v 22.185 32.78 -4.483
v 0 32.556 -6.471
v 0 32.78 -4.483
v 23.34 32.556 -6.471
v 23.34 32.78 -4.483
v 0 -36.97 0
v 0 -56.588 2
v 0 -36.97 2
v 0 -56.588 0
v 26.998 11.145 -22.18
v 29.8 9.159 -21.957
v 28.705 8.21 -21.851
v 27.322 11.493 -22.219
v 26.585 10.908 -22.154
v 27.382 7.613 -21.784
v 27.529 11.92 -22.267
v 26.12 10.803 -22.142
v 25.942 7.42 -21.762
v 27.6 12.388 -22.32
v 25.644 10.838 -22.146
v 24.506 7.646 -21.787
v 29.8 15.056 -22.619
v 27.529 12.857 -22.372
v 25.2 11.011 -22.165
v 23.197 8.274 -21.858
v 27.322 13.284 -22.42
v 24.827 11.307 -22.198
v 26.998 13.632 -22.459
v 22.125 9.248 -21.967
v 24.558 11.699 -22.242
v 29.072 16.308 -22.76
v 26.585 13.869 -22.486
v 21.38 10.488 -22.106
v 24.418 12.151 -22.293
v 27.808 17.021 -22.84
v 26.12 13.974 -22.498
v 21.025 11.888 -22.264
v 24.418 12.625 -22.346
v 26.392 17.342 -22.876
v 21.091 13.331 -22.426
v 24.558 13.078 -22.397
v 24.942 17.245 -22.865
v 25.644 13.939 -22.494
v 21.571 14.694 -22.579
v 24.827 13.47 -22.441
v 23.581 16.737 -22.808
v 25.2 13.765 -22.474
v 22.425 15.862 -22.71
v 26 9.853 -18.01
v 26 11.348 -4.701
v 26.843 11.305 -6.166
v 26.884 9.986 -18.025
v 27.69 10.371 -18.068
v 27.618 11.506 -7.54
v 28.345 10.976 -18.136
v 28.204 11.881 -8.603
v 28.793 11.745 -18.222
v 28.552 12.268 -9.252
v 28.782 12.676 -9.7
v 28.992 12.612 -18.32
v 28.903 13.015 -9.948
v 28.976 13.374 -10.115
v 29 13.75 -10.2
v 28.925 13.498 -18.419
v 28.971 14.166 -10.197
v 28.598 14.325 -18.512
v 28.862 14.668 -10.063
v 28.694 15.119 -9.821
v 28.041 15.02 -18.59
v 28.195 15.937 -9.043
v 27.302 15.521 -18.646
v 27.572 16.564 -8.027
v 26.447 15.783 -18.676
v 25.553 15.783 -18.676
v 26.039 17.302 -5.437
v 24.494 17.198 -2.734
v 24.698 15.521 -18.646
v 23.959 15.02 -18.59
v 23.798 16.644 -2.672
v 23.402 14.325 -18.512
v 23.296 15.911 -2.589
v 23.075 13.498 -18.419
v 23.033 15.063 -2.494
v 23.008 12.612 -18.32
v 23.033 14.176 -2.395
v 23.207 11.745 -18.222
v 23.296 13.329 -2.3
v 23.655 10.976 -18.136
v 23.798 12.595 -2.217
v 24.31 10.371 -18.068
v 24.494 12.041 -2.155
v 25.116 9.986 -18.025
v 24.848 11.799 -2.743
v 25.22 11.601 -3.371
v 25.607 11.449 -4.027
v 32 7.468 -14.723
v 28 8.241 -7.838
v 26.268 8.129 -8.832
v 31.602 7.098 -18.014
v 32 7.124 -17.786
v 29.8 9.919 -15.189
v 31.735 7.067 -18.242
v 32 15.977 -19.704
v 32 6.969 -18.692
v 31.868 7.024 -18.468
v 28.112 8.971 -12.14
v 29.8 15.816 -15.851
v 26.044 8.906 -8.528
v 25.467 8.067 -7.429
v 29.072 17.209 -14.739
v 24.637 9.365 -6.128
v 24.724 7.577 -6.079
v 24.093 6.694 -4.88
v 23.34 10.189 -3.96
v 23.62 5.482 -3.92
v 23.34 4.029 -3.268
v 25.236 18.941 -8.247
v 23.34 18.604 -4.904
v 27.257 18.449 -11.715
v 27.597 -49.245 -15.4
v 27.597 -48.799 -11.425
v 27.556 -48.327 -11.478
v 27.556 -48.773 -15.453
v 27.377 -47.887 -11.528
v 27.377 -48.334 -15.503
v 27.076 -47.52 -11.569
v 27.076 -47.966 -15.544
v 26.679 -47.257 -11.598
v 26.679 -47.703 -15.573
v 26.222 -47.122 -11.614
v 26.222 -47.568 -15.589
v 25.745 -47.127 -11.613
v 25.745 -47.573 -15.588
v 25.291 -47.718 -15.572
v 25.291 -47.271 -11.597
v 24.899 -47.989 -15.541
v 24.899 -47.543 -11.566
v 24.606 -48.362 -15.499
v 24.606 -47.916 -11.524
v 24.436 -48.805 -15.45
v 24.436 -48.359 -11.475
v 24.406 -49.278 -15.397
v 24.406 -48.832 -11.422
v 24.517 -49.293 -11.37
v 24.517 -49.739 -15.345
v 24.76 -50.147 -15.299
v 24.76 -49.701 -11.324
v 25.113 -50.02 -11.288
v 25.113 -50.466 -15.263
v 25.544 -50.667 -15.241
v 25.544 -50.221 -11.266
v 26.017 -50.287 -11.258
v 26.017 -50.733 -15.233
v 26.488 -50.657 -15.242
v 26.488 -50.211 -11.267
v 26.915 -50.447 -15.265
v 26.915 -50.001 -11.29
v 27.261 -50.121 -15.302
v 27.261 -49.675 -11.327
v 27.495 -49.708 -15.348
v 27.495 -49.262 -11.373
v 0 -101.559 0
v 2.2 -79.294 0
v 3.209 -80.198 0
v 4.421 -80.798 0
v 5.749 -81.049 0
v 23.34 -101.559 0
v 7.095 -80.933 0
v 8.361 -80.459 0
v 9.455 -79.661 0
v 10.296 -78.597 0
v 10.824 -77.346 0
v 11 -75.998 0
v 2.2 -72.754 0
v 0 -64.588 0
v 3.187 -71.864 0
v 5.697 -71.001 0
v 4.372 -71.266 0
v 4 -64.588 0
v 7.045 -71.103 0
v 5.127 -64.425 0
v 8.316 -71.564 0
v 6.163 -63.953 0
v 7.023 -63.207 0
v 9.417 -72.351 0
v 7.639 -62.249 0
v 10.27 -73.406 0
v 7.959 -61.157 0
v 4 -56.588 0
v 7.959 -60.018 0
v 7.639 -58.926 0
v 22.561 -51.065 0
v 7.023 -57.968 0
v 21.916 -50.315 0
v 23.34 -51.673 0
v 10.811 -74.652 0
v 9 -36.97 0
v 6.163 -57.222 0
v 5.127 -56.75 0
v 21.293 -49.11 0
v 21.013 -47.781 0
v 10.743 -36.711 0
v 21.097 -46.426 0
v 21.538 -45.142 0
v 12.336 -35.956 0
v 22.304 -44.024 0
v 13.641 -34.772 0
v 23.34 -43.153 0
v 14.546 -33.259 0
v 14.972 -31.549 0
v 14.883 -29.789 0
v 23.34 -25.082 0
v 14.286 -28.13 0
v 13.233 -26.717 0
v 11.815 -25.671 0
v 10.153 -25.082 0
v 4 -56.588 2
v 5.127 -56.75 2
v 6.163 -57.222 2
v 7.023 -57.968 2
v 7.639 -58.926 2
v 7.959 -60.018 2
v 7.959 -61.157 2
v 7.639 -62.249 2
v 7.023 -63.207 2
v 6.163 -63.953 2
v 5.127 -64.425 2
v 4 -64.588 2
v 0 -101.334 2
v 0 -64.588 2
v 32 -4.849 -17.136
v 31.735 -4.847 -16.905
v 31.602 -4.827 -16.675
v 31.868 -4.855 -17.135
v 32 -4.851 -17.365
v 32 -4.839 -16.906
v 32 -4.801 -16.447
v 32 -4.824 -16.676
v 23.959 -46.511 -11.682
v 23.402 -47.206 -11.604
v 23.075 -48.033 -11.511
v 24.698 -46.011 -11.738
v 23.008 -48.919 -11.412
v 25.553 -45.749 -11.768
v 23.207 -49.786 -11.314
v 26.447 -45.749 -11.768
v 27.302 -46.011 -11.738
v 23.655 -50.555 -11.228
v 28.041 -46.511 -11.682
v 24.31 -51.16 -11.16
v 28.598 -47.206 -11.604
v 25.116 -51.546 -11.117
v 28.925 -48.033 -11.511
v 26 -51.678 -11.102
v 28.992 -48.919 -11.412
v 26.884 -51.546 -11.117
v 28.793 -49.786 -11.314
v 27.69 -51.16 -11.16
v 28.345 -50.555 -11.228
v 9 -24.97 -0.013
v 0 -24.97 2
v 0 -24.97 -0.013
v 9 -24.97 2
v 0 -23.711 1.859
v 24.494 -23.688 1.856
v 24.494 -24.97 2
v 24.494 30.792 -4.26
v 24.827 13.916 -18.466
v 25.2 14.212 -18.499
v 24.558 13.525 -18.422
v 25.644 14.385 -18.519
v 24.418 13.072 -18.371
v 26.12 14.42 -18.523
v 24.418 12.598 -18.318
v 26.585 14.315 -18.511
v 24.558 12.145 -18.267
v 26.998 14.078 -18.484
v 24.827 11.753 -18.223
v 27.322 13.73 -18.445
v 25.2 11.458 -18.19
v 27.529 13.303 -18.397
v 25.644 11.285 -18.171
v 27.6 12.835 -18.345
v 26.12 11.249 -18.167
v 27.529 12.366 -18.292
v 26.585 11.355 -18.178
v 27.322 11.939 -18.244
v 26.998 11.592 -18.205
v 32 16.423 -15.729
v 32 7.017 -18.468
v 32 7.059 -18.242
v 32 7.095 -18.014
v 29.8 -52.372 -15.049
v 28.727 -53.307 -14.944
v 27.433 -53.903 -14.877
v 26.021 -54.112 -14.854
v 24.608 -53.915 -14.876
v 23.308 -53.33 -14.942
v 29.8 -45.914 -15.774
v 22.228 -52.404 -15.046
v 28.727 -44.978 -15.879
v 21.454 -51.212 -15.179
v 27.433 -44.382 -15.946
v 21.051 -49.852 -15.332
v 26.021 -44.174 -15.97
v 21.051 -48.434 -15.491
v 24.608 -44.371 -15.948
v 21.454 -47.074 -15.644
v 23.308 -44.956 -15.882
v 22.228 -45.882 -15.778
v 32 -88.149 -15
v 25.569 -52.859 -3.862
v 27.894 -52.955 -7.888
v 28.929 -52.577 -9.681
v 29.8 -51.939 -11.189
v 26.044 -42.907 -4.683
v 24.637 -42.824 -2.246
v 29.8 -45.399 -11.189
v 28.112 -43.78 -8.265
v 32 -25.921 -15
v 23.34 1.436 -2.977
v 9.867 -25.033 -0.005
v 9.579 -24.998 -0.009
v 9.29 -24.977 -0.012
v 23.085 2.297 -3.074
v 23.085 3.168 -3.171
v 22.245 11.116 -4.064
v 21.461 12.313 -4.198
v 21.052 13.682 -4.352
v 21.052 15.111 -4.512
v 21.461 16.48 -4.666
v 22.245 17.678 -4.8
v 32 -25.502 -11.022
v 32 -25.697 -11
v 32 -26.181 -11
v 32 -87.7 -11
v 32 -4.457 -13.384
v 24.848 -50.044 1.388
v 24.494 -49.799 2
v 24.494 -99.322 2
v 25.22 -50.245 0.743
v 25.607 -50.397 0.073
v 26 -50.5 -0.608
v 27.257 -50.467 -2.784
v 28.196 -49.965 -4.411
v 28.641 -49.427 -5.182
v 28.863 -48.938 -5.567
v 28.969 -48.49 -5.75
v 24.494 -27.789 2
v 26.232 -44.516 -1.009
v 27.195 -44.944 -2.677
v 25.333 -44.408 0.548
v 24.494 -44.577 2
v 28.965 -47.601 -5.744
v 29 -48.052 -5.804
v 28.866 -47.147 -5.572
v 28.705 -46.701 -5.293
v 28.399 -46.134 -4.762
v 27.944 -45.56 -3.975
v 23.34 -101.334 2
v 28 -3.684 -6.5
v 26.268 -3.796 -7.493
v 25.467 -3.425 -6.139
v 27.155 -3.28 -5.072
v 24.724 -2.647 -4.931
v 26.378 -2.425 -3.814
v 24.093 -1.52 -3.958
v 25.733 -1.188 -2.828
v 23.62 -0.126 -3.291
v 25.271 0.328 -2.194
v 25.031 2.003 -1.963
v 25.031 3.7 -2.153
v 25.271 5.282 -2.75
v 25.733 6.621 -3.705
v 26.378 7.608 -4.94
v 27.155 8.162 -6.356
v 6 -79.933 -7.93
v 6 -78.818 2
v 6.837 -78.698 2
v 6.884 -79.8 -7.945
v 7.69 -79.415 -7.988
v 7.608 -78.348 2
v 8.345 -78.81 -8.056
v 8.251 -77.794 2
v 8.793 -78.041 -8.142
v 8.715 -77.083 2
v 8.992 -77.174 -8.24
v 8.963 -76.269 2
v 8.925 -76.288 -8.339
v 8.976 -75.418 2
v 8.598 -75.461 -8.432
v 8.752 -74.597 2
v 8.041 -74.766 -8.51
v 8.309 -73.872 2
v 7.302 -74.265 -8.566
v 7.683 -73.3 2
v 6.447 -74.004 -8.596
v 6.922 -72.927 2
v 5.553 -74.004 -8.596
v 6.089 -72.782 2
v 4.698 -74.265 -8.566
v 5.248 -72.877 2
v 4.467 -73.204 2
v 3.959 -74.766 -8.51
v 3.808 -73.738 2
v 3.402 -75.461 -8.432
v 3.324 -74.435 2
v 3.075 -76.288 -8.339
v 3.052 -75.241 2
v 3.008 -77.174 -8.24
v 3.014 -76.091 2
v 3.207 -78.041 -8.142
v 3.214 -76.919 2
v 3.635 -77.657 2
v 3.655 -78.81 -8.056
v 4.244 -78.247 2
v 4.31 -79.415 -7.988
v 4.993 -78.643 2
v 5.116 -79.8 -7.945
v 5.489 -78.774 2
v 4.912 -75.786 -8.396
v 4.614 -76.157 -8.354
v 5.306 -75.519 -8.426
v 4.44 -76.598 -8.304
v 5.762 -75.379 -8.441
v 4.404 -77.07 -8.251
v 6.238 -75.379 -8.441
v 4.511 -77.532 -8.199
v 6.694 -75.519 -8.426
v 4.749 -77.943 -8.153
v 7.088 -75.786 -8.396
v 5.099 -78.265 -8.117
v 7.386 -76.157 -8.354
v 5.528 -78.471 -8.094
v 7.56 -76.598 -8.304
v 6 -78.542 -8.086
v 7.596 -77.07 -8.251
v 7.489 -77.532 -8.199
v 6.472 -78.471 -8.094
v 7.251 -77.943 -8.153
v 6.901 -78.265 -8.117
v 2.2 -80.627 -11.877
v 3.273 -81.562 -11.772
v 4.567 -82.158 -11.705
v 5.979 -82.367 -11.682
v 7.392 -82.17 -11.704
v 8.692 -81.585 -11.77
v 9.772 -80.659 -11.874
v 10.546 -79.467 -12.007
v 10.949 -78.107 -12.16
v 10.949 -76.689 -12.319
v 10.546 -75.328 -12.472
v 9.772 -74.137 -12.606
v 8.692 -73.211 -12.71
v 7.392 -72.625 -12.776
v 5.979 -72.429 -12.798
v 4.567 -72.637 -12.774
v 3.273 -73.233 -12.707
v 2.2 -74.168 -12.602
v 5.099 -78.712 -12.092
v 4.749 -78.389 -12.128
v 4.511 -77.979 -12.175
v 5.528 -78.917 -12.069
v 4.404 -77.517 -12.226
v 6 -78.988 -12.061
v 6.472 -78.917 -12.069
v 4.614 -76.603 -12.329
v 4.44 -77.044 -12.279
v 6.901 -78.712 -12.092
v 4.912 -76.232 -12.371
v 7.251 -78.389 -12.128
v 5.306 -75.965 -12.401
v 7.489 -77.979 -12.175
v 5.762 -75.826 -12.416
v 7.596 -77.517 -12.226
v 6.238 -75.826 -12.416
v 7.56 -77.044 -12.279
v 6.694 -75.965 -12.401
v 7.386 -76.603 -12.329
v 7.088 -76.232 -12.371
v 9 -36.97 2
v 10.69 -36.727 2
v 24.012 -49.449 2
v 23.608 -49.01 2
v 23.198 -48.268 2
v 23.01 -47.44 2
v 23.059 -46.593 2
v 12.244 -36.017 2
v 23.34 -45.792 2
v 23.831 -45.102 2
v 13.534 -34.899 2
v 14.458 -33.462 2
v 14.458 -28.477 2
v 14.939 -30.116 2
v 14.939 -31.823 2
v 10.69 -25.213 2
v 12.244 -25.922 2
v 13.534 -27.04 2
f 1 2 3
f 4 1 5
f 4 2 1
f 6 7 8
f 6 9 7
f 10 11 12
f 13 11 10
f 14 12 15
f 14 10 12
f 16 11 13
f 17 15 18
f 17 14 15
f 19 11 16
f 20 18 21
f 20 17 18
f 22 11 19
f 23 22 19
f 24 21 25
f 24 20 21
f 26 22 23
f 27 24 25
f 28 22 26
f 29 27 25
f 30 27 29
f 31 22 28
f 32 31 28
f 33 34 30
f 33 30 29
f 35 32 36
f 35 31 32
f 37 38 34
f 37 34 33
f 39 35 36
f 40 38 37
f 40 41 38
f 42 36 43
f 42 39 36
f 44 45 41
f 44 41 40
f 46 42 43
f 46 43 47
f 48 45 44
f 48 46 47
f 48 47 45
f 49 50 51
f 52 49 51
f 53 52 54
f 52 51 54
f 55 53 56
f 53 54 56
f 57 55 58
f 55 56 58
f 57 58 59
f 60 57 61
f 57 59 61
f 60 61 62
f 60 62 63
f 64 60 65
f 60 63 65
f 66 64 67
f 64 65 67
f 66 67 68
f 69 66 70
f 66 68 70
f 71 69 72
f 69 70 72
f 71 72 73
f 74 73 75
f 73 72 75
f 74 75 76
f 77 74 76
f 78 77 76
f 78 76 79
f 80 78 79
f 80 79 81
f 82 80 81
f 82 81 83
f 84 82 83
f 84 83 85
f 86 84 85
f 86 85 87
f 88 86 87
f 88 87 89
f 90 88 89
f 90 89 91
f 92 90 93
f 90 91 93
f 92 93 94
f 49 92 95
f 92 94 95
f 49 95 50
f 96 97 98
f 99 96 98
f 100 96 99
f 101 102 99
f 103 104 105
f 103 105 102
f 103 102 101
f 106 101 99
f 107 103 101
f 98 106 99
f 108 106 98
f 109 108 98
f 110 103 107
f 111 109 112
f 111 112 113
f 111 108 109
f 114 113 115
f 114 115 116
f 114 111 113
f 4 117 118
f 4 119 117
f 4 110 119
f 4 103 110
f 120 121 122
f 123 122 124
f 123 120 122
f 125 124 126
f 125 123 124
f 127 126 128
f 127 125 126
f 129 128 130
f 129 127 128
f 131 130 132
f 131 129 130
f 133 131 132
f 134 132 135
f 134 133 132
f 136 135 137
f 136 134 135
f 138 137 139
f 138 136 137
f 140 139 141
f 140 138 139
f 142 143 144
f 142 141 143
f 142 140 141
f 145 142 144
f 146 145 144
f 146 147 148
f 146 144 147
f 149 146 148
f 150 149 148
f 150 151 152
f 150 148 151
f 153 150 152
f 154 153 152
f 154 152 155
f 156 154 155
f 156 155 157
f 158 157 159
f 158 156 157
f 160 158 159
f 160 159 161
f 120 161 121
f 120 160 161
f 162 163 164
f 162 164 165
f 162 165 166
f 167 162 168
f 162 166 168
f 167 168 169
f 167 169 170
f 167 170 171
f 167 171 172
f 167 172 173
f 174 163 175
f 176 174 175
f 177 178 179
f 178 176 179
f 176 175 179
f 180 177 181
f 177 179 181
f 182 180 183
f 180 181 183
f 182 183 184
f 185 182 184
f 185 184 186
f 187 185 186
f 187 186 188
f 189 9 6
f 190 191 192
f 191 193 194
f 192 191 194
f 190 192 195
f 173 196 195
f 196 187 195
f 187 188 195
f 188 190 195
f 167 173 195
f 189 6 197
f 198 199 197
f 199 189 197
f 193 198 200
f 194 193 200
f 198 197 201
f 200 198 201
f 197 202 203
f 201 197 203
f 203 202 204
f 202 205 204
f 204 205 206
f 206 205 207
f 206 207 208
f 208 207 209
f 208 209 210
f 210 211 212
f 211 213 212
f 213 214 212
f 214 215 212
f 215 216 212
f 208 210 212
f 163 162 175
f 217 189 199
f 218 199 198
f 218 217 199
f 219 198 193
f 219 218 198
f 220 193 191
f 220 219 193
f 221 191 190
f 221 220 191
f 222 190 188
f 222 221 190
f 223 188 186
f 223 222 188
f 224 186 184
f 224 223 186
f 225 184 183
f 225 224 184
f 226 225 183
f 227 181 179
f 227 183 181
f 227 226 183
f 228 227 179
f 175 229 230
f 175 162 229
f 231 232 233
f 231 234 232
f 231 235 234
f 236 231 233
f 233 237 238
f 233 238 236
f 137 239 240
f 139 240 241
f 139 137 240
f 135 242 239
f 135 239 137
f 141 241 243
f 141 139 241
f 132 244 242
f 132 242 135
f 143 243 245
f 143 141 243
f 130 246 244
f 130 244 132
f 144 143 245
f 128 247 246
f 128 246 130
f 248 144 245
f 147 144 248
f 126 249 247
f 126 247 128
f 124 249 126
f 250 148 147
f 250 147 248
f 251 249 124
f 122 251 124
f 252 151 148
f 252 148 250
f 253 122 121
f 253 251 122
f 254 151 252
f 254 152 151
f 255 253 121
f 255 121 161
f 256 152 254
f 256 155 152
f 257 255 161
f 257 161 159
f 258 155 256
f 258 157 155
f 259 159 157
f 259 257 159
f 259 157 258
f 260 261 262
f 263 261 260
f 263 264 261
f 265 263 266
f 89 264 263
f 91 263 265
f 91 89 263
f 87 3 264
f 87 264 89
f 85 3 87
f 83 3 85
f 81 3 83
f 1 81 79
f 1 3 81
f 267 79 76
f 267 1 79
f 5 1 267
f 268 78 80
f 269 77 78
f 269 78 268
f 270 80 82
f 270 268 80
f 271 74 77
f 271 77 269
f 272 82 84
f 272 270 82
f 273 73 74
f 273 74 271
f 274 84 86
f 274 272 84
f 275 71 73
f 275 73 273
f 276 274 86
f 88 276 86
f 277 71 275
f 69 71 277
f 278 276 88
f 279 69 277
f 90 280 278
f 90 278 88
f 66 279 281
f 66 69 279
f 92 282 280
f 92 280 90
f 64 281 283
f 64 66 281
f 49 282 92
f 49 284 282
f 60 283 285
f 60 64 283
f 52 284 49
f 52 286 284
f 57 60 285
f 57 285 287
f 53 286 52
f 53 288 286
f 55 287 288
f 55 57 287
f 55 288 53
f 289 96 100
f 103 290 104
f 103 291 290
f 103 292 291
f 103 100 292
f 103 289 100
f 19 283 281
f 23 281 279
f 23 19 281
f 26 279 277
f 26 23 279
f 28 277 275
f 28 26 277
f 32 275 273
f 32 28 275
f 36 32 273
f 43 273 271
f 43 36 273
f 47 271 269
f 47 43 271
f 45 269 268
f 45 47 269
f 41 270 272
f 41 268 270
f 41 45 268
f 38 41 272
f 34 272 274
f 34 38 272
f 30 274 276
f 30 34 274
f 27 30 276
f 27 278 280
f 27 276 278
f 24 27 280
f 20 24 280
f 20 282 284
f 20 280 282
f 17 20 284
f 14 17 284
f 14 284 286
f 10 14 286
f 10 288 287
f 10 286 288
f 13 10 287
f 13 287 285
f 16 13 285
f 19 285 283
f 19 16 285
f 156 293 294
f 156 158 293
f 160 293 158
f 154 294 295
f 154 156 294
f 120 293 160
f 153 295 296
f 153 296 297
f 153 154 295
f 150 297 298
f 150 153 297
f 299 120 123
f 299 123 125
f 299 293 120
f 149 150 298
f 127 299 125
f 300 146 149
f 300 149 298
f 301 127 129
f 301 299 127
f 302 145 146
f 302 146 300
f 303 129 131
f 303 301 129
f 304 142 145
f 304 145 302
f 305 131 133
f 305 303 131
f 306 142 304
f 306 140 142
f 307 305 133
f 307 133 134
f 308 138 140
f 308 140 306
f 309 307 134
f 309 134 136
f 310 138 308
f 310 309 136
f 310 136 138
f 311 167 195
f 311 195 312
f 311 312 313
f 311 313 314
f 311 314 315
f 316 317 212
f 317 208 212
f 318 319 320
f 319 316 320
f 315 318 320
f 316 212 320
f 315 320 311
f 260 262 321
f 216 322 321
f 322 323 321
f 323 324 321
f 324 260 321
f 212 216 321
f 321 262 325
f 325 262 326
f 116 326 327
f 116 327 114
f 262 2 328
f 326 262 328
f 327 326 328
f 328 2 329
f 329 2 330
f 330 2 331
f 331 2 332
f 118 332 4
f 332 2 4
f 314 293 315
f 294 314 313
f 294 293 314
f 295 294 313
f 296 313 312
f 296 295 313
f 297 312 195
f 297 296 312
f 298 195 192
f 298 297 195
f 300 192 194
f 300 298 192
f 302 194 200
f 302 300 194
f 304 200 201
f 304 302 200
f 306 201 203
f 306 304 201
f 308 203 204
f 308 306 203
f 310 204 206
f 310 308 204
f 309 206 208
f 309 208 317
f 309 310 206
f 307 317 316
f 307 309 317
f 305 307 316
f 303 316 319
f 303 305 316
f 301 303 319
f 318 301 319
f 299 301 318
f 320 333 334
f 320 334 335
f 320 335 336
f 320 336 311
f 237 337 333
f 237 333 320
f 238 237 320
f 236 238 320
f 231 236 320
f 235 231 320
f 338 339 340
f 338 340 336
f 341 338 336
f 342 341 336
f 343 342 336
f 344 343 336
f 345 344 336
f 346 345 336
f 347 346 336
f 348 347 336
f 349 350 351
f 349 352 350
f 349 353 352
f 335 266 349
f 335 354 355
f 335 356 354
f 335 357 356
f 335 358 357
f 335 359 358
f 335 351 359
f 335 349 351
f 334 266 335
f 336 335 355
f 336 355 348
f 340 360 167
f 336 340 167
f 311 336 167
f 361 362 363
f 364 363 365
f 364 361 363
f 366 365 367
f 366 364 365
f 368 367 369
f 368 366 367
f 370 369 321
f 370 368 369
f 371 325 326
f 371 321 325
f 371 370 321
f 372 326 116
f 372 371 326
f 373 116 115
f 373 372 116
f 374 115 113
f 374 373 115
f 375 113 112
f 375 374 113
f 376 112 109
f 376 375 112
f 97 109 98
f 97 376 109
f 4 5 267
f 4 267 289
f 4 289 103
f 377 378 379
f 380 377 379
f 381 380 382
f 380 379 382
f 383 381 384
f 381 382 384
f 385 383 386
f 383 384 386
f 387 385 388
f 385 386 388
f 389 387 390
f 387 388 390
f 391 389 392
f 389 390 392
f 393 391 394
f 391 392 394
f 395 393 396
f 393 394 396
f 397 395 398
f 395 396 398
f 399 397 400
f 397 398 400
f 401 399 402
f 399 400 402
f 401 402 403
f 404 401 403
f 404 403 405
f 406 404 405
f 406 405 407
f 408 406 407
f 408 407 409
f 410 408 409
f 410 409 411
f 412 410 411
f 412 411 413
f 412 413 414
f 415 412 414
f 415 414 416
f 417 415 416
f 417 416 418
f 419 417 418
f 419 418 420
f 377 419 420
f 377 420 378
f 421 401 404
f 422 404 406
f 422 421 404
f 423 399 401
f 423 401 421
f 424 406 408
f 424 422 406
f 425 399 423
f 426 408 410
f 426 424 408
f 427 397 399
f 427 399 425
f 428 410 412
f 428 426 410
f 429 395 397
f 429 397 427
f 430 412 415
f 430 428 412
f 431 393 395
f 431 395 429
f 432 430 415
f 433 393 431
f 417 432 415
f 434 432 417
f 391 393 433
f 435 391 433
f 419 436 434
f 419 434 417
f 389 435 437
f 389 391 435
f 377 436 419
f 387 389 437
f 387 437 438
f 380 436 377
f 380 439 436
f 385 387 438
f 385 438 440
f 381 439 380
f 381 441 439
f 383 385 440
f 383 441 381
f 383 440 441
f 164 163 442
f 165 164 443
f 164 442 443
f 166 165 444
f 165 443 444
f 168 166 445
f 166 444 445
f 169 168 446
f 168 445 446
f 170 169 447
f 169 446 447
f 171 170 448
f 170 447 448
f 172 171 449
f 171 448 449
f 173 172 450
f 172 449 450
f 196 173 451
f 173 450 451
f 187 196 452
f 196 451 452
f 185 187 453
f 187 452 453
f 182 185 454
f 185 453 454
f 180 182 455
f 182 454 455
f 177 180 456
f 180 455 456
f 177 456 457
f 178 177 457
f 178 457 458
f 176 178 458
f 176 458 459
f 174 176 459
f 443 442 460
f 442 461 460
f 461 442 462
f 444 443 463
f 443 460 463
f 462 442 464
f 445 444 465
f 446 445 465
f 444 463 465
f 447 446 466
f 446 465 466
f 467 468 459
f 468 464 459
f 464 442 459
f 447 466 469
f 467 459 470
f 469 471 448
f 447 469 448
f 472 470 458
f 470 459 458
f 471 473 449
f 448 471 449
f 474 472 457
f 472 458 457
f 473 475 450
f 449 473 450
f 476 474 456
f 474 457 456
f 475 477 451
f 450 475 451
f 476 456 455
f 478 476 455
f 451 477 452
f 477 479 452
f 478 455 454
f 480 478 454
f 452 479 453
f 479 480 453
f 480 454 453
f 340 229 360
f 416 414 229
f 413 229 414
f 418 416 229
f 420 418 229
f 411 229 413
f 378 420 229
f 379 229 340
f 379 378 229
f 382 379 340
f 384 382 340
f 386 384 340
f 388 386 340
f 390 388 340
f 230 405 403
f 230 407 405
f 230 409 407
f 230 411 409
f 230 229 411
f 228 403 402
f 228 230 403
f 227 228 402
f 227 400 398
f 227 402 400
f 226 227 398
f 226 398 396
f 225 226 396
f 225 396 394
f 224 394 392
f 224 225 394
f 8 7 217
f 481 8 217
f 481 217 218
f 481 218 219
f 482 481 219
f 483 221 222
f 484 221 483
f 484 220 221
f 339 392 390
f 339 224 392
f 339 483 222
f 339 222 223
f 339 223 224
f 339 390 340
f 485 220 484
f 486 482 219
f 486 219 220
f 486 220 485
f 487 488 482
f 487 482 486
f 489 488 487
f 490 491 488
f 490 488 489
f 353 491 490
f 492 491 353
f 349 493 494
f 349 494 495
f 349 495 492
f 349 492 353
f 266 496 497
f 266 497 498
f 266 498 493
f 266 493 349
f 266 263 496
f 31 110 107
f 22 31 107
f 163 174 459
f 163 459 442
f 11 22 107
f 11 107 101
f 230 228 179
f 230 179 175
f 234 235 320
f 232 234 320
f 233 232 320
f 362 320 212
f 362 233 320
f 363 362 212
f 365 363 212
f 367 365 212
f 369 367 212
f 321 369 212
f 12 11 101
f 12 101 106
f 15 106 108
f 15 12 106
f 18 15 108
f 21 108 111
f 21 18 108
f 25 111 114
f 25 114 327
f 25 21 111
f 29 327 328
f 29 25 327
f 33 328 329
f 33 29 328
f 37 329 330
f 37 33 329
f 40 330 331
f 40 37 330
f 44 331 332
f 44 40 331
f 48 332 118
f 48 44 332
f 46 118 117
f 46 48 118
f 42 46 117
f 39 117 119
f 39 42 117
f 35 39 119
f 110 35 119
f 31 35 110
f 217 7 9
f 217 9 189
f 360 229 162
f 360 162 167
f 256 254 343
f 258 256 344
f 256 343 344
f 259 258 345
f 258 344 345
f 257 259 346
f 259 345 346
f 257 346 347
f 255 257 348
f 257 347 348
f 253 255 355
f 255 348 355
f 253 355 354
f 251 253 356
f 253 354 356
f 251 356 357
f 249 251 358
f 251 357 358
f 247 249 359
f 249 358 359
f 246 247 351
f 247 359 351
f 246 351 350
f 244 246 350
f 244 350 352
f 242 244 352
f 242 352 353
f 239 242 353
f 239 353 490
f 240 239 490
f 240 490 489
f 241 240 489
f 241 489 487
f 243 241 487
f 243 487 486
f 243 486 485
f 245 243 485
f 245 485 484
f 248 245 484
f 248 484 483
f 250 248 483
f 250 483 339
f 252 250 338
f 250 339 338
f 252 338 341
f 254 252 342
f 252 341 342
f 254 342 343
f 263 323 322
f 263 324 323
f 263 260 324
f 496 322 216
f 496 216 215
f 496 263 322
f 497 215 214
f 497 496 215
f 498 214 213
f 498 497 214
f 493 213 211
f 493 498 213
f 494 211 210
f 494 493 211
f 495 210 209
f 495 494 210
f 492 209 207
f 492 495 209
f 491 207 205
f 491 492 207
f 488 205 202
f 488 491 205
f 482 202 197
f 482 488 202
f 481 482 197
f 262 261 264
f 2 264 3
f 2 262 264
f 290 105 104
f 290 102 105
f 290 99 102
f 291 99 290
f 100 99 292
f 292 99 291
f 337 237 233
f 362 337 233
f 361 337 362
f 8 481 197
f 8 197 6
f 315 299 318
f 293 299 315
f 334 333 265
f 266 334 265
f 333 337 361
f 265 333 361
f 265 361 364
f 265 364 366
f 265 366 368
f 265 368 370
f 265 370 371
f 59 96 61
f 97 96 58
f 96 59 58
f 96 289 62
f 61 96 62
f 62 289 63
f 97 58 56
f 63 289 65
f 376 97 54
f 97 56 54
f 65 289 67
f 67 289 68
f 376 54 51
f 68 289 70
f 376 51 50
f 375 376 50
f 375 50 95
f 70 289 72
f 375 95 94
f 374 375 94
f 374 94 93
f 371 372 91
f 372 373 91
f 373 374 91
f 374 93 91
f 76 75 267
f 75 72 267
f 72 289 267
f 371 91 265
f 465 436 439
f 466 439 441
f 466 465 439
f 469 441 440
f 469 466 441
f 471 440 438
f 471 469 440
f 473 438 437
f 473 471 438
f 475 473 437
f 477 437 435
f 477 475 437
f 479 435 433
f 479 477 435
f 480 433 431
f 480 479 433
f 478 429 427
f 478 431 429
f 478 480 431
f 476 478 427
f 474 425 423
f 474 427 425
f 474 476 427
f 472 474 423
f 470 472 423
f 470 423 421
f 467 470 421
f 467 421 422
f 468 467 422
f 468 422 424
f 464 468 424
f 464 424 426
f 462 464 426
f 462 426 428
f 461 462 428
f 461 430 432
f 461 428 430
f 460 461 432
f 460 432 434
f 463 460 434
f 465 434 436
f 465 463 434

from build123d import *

# Parameters (mm, degrees)
SKETCH1_W           = 23.339745962
SKETCH1_H           = 77.847771952
EXTRUDE1_DEPTH      = 2
SKETCH2_W           = 23.339745962
SKETCH2_H           = 58.47295833
EXTRUDE2_DEPTH      = 2
EXTRUDE3_DEPTH      = 2
EXTRUDE4_DEPTH      = 2
SKETCH5_W           = 29.172294857
SKETCH5_H           = 114.252589879
CUT_EXTRUDE1_DEPTH  = 2
SKETCH6_W           = 35.17541313
SKETCH6_H           = 36.355570025
CUT_EXTRUDE3_DEPTH  = 9
SKETCH7_W           = 29.640366785
SKETCH7_H           = 86.495658127
CUT_EXTRUDE4_DEPTH  = 9
SKETCH8_W           = 29.536232552
SKETCH8_H           = 67.327773858
CUT_EXTRUDE5_DEPTH  = 9
SKETCH9_W           = 23.303500438
SKETCH9_H           = 17.745035166
CUT_EXTRUDE6_DEPTH  = 9
SKETCH10_W          = 29.605950058
SKETCH10_H          = 24.209977647
CUT_EXTRUDE7_DEPTH  = 9
SKETCH11_W          = 17.28028661
SKETCH11_H          = 57.043927735
CUT_EXTRUDE8_DEPTH  = 9
SKETCH12_W          = 46.644962208
SKETCH12_H          = 26.527348651
CUT_EXTRUDE9_DEPTH  = 9
SKETCH13_W          = 27.90261226
SKETCH13_H          = 36.830907155
CUT_EXTRUDE10_DEPTH = 9
CUT_EXTRUDE11_DEPTH = 9
CUT_EXTRUDE12_DEPTH = 9
EXTRUDE5_REACH      = 108.706
SKETCH16_R          = 1.6
SKETCH18_R          = 3
CUT_EXTRUDE13_DEPTH = 16
CUT_EXTRUDE14_DEPTH = 46


with BuildPart() as part:
    # Sketch1 → Extrude1 (new body)
    with BuildSketch(Plane.XY):
        with Locations((11.669872981, -62.635077412)):
            Rectangle(SKETCH1_W, SKETCH1_H)
    extrude(amount=EXTRUDE1_DEPTH)

    # Sketch2 → Extrude2 (add)
    with BuildSketch(Plane(origin=(0, -0.312184271, -2.780754984), x_dir=(1, 0, 0), z_dir=(-1.8145207558717603e-15, 0.11156514837203096, 0.9937571220719512))):
        with Locations((11.669872981, 3.838577658)):
            Rectangle(SKETCH2_W, SKETCH2_H)
    extrude(amount=EXTRUDE2_DEPTH)

    # Sketch3 → Extrude3 (add)
    with BuildSketch(Plane(origin=(17.504809472, 0, 10.106406461), x_dir=(0.49999999999999906, -1.634548474587185e-15, -0.8660254037844393), z_dir=(0.8660254037844392, -2.831121005419217e-15, 0.499999999999999))):
        Polygon((7.883442522, -104.490571733), (28.990381057, -88.148722114), (28.990381057, -25.920882689), (7.883442522, -23.352575413), align=None)
    extrude(amount=EXTRUDE3_DEPTH)

    # Sketch4 → Extrude4 (add)
    with BuildSketch(Plane(origin=(16.293142957, 1.049476669, 9.348124653), x_dir=(0.49585100083824124, 0.031938838189501655, -0.8678200824956861), z_dir=(0.8660254037844394, 0.055782574186015135, 0.49687856103597455))):
        Polygon((16.15670827, 37.302716602), (33.476734925, 13.886588158), (28.056650386, -27.924204291), (7.502507009, -29.456207578), align=None)
    extrude(amount=EXTRUDE4_DEPTH)

    # Sketch5 → Cut-Extrude1 (cut)
    with BuildSketch(Plane(origin=(32, 0, 0), x_dir=(0, 0, -1), z_dir=(1, 0, 0))):
        with Locations((10.907999104, -37.350448714)):
            Rectangle(SKETCH5_W, SKETCH5_H)
    extrude(amount=CUT_EXTRUDE1_DEPTH, mode=Mode.SUBTRACT)

    # Sketch6 → Cut-Extrude3 (cut)
    with BuildSketch(Plane(origin=(0, -100.294881076, 11.25970626), x_dir=(1, 0, 0), z_dir=(0, -0.9937571220719427, 0.11156514837210559))):
        with Locations((14.876045987, -2.775102741)):
            Rectangle(SKETCH6_W, SKETCH6_H)
    extrude(amount=CUT_EXTRUDE3_DEPTH, mode=Mode.SUBTRACT)

    # Sketch7 → Cut-Extrude4 (cut)
    with BuildSketch(Plane.XY.offset(2)):
        with Locations((12.797447922, -61.090112125)):
            Rectangle(SKETCH7_W, SKETCH7_H)
    extrude(amount=CUT_EXTRUDE4_DEPTH, mode=Mode.SUBTRACT)

    # Sketch8 → Cut-Extrude5 (cut)
    with BuildSketch(Plane(origin=(0, -0.089053974, -0.79324074), x_dir=(1, 0, 0), z_dir=(-1.815565503199705e-15, 0.11156514837203098, 0.9937571220719512))):
        with Locations((12.836169201, 6.237775634)):
            Rectangle(SKETCH8_W, SKETCH8_H)
    extrude(amount=CUT_EXTRUDE5_DEPTH, mode=Mode.SUBTRACT)

    # Sketch9 → Cut-Extrude6 (cut)
    with BuildSketch(Plane(origin=(19.236860279, 0, 11.106406461), x_dir=(0.499999999999999, -1.6472663592524059e-15, -0.8660254037844393), z_dir=(0.8660254037844393, -2.8531490278241828e-15, 0.499999999999999))):
        with Locations((15.539372555, -25.628375436)):
            Rectangle(SKETCH9_W, SKETCH9_H)
    extrude(amount=CUT_EXTRUDE6_DEPTH, mode=Mode.SUBTRACT)

    # Sketch10 → Cut-Extrude7 (cut)
    with BuildSketch(Plane(origin=(18.025193764, 1.161041817, 10.341881775), x_dir=(0.49585100083824124, 0.03193883818950166, -0.8678200824956862), z_dir=(0.8660254037844393, 0.05578257418601514, 0.49687856103597444))):
        with Locations((15.868735202, -22.435122808)):
            Rectangle(SKETCH10_W, SKETCH10_H)
    extrude(amount=CUT_EXTRUDE7_DEPTH, mode=Mode.SUBTRACT)

    # Sketch11 → Cut-Extrude8 (cut)
    with BuildSketch(Plane(origin=(0, 32.868573281, -3.690023622), x_dir=(1, 0, 0), z_dir=(0, 0.9937571220719428, -0.11156514837210517))):
        with Locations((25.498335125, 2.54094703)):
            Rectangle(SKETCH11_W, SKETCH11_H)
    extrude(amount=CUT_EXTRUDE8_DEPTH, mode=Mode.SUBTRACT)

    # Sketch12 → Cut-Extrude9 (cut)
    with BuildSketch(Plane(origin=(31.826729192, 18.260456719, -2.050028642), x_dir=(-0.048384463847340485, -0.027760389785225534, -0.9984429399906526), z_dir=(0.8660254037844403, 0.496878561035969, -0.055782574186050725))):
        with Locations((12.073297204, 7.763321363)):
            Rectangle(SKETCH12_W, SKETCH12_H)
    extrude(amount=CUT_EXTRUDE9_DEPTH, mode=Mode.SUBTRACT)

    # Sketch13 → Cut-Extrude10 (cut)
    with BuildSketch(Plane(origin=(61.206591805, -35.117033668, 3.942449301), x_dir=(0.048384463847343365, -0.027760389785227164, -0.9984429399906524), z_dir=(0.8660254037844402, -0.49687856103596856, 0.055782574186054035))):
        with Locations((11.882531158, -68.145692396)):
            Rectangle(SKETCH13_W, SKETCH13_H)
    extrude(amount=CUT_EXTRUDE10_DEPTH, mode=Mode.SUBTRACT)

    # Sketch14 → Cut-Extrude11 (cut)
    with BuildSketch(Plane.XY.offset(2)):
        with BuildLine():
            Line((-5.730960927, -24.969609587), (9, -24.969609587))
            ThreePointArc((9, -24.969609587), (15, -30.969609587), (9, -36.969609587))
            Line((9, -36.969609587), (-5.730960927, -36.969609587))
            ThreePointArc((-5.730960927, -36.969609587), (-11.730960927, -30.969609587), (-5.730960927, -24.969609587))
        make_face()
    extrude(amount=-CUT_EXTRUDE11_DEPTH, mode=Mode.SUBTRACT)

    # Sketch15 → Cut-Extrude12 (cut)
    with BuildSketch(Plane(origin=(18.025193764, 1.161041817, 10.341881775), x_dir=(0.49585100083824163, 0.03193883818950172, -0.8678200824956859), z_dir=(0.866025403784439, 0.055782574186015205, 0.49687856103597494))):
        with BuildLine():
            Line((20.949277707, 6.423782658), (31.529743864, 5.052198489))
            ThreePointArc((31.529743864, 5.052198489), (36.708608329, -1.669361066), (29.987048774, -6.848225531))
            Line((29.987048774, -6.848225531), (19.406582616, -5.476641362))
            ThreePointArc((19.406582616, -5.476641362), (14.227718152, 1.244918193), (20.949277707, 6.423782658))
        make_face()
    extrude(amount=-CUT_EXTRUDE12_DEPTH, mode=Mode.SUBTRACT)

    # Sketch16 → Extrude5 (add, up to next)
    with BuildSketch(Plane(origin=(0, -2.320356941, -20.668383181), x_dir=(1, 0, 0), z_dir=(-1.8077100882975075e-15, 0.111565148372031, 0.9937571220719512)), mode=Mode.PRIVATE) as extrude5_sk1:
        with BuildLine():
            Line((29.8, 11.55156303), (29.8, 17.4855686))
            Line((29.8, 17.4855686), (29.072366829, 18.745866221))
            ThreePointArc((29.072366829, 18.745866221), (21.025378802, 14.298044274), (29.8, 11.55156303))
        make_face()
        with Locations((26, 14.801178392)):
            Circle(SKETCH16_R, mode=Mode.SUBTRACT)
    extrude5_tool1 = extrude(extrude5_sk1.sketch, amount=EXTRUDE5_REACH, mode=Mode.PRIVATE) - part.part
    # Sketch16 → Extrude5 (add, up to next)
    with BuildSketch(Plane(origin=(0, -2.320356941, -20.668383181), x_dir=(1, 0, 0), z_dir=(-1.8077100882975075e-15, 0.111565148372031, 0.9937571220719512)), mode=Mode.PRIVATE) as extrude5_sk2:
        with BuildLine():
            ThreePointArc((2.2, -78.798690089), (11, -75.549074727), (2.2, -72.299459365))
            Line((2.2, -72.299459365), (2.2, -78.798690089))
        make_face()
        with Locations((6, -75.549074727)):
            Circle(SKETCH16_R, mode=Mode.SUBTRACT)
    extrude5_tool2 = extrude(extrude5_sk2.sketch, amount=EXTRUDE5_REACH, mode=Mode.PRIVATE) - part.part
    # Sketch16 → Extrude5 (add, up to next)
    with BuildSketch(Plane(origin=(0, -2.320356941, -20.668383181), x_dir=(1, 0, 0), z_dir=(-1.8077100882975075e-15, 0.111565148372031, 0.9937571220719512)), mode=Mode.PRIVATE) as extrude5_sk3:
        with BuildLine():
            Line((29.8, -50.366348697), (29.8, -43.867117974))
            ThreePointArc((29.8, -43.867117974), (21, -47.116733335), (29.8, -50.366348697))
        make_face()
        with Locations((26, -47.116733335)):
            Circle(SKETCH16_R, mode=Mode.SUBTRACT)
    extrude5_tool3 = extrude(extrude5_sk3.sketch, amount=EXTRUDE5_REACH, mode=Mode.PRIVATE) - part.part
    add(extrude5_tool1.solids().sort_by_distance((21.157909, 11.901747, -22.265042))[0])
    add(extrude5_tool2.solids().sort_by_distance((10.866793, -77.397788, -12.239739))[0])
    add(extrude5_tool3.solids().sort_by_distance((29.666793, -49.142946, -15.411798))[0])

    # Sketch18 → Cut-Extrude13 (cut)
    with BuildSketch(Plane(origin=(0, -0.089053974, -0.79324074), x_dir=(1, 0, 0), z_dir=(-1.8077100882975075e-15, 0.111565148372031, 0.9937571220719512))):
        with Locations((26, 14.801178392)):
            Circle(SKETCH18_R)
        with Locations((26, -47.116733335)):
            Circle(SKETCH18_R)
        with Locations((6, -75.549074727)):
            Circle(SKETCH18_R)
    extrude(amount=-CUT_EXTRUDE13_DEPTH, mode=Mode.SUBTRACT)

    # Sketch19 → Cut-Extrude14 (cut)
    with BuildSketch(Plane.XY.offset(2)):
        with BuildLine():
            Line((-9.54644603, -56.58750618), (4, -56.58750618))
            ThreePointArc((4, -56.58750618), (8, -60.58750618), (4, -64.58750618))
            Line((4, -64.58750618), (-9.54644603, -64.58750618))
            ThreePointArc((-9.54644603, -64.58750618), (-13.54644603, -60.58750618), (-9.54644603, -56.58750618))
        make_face()
    extrude(amount=-CUT_EXTRUDE14_DEPTH, mode=Mode.SUBTRACT)


solid = part.part
